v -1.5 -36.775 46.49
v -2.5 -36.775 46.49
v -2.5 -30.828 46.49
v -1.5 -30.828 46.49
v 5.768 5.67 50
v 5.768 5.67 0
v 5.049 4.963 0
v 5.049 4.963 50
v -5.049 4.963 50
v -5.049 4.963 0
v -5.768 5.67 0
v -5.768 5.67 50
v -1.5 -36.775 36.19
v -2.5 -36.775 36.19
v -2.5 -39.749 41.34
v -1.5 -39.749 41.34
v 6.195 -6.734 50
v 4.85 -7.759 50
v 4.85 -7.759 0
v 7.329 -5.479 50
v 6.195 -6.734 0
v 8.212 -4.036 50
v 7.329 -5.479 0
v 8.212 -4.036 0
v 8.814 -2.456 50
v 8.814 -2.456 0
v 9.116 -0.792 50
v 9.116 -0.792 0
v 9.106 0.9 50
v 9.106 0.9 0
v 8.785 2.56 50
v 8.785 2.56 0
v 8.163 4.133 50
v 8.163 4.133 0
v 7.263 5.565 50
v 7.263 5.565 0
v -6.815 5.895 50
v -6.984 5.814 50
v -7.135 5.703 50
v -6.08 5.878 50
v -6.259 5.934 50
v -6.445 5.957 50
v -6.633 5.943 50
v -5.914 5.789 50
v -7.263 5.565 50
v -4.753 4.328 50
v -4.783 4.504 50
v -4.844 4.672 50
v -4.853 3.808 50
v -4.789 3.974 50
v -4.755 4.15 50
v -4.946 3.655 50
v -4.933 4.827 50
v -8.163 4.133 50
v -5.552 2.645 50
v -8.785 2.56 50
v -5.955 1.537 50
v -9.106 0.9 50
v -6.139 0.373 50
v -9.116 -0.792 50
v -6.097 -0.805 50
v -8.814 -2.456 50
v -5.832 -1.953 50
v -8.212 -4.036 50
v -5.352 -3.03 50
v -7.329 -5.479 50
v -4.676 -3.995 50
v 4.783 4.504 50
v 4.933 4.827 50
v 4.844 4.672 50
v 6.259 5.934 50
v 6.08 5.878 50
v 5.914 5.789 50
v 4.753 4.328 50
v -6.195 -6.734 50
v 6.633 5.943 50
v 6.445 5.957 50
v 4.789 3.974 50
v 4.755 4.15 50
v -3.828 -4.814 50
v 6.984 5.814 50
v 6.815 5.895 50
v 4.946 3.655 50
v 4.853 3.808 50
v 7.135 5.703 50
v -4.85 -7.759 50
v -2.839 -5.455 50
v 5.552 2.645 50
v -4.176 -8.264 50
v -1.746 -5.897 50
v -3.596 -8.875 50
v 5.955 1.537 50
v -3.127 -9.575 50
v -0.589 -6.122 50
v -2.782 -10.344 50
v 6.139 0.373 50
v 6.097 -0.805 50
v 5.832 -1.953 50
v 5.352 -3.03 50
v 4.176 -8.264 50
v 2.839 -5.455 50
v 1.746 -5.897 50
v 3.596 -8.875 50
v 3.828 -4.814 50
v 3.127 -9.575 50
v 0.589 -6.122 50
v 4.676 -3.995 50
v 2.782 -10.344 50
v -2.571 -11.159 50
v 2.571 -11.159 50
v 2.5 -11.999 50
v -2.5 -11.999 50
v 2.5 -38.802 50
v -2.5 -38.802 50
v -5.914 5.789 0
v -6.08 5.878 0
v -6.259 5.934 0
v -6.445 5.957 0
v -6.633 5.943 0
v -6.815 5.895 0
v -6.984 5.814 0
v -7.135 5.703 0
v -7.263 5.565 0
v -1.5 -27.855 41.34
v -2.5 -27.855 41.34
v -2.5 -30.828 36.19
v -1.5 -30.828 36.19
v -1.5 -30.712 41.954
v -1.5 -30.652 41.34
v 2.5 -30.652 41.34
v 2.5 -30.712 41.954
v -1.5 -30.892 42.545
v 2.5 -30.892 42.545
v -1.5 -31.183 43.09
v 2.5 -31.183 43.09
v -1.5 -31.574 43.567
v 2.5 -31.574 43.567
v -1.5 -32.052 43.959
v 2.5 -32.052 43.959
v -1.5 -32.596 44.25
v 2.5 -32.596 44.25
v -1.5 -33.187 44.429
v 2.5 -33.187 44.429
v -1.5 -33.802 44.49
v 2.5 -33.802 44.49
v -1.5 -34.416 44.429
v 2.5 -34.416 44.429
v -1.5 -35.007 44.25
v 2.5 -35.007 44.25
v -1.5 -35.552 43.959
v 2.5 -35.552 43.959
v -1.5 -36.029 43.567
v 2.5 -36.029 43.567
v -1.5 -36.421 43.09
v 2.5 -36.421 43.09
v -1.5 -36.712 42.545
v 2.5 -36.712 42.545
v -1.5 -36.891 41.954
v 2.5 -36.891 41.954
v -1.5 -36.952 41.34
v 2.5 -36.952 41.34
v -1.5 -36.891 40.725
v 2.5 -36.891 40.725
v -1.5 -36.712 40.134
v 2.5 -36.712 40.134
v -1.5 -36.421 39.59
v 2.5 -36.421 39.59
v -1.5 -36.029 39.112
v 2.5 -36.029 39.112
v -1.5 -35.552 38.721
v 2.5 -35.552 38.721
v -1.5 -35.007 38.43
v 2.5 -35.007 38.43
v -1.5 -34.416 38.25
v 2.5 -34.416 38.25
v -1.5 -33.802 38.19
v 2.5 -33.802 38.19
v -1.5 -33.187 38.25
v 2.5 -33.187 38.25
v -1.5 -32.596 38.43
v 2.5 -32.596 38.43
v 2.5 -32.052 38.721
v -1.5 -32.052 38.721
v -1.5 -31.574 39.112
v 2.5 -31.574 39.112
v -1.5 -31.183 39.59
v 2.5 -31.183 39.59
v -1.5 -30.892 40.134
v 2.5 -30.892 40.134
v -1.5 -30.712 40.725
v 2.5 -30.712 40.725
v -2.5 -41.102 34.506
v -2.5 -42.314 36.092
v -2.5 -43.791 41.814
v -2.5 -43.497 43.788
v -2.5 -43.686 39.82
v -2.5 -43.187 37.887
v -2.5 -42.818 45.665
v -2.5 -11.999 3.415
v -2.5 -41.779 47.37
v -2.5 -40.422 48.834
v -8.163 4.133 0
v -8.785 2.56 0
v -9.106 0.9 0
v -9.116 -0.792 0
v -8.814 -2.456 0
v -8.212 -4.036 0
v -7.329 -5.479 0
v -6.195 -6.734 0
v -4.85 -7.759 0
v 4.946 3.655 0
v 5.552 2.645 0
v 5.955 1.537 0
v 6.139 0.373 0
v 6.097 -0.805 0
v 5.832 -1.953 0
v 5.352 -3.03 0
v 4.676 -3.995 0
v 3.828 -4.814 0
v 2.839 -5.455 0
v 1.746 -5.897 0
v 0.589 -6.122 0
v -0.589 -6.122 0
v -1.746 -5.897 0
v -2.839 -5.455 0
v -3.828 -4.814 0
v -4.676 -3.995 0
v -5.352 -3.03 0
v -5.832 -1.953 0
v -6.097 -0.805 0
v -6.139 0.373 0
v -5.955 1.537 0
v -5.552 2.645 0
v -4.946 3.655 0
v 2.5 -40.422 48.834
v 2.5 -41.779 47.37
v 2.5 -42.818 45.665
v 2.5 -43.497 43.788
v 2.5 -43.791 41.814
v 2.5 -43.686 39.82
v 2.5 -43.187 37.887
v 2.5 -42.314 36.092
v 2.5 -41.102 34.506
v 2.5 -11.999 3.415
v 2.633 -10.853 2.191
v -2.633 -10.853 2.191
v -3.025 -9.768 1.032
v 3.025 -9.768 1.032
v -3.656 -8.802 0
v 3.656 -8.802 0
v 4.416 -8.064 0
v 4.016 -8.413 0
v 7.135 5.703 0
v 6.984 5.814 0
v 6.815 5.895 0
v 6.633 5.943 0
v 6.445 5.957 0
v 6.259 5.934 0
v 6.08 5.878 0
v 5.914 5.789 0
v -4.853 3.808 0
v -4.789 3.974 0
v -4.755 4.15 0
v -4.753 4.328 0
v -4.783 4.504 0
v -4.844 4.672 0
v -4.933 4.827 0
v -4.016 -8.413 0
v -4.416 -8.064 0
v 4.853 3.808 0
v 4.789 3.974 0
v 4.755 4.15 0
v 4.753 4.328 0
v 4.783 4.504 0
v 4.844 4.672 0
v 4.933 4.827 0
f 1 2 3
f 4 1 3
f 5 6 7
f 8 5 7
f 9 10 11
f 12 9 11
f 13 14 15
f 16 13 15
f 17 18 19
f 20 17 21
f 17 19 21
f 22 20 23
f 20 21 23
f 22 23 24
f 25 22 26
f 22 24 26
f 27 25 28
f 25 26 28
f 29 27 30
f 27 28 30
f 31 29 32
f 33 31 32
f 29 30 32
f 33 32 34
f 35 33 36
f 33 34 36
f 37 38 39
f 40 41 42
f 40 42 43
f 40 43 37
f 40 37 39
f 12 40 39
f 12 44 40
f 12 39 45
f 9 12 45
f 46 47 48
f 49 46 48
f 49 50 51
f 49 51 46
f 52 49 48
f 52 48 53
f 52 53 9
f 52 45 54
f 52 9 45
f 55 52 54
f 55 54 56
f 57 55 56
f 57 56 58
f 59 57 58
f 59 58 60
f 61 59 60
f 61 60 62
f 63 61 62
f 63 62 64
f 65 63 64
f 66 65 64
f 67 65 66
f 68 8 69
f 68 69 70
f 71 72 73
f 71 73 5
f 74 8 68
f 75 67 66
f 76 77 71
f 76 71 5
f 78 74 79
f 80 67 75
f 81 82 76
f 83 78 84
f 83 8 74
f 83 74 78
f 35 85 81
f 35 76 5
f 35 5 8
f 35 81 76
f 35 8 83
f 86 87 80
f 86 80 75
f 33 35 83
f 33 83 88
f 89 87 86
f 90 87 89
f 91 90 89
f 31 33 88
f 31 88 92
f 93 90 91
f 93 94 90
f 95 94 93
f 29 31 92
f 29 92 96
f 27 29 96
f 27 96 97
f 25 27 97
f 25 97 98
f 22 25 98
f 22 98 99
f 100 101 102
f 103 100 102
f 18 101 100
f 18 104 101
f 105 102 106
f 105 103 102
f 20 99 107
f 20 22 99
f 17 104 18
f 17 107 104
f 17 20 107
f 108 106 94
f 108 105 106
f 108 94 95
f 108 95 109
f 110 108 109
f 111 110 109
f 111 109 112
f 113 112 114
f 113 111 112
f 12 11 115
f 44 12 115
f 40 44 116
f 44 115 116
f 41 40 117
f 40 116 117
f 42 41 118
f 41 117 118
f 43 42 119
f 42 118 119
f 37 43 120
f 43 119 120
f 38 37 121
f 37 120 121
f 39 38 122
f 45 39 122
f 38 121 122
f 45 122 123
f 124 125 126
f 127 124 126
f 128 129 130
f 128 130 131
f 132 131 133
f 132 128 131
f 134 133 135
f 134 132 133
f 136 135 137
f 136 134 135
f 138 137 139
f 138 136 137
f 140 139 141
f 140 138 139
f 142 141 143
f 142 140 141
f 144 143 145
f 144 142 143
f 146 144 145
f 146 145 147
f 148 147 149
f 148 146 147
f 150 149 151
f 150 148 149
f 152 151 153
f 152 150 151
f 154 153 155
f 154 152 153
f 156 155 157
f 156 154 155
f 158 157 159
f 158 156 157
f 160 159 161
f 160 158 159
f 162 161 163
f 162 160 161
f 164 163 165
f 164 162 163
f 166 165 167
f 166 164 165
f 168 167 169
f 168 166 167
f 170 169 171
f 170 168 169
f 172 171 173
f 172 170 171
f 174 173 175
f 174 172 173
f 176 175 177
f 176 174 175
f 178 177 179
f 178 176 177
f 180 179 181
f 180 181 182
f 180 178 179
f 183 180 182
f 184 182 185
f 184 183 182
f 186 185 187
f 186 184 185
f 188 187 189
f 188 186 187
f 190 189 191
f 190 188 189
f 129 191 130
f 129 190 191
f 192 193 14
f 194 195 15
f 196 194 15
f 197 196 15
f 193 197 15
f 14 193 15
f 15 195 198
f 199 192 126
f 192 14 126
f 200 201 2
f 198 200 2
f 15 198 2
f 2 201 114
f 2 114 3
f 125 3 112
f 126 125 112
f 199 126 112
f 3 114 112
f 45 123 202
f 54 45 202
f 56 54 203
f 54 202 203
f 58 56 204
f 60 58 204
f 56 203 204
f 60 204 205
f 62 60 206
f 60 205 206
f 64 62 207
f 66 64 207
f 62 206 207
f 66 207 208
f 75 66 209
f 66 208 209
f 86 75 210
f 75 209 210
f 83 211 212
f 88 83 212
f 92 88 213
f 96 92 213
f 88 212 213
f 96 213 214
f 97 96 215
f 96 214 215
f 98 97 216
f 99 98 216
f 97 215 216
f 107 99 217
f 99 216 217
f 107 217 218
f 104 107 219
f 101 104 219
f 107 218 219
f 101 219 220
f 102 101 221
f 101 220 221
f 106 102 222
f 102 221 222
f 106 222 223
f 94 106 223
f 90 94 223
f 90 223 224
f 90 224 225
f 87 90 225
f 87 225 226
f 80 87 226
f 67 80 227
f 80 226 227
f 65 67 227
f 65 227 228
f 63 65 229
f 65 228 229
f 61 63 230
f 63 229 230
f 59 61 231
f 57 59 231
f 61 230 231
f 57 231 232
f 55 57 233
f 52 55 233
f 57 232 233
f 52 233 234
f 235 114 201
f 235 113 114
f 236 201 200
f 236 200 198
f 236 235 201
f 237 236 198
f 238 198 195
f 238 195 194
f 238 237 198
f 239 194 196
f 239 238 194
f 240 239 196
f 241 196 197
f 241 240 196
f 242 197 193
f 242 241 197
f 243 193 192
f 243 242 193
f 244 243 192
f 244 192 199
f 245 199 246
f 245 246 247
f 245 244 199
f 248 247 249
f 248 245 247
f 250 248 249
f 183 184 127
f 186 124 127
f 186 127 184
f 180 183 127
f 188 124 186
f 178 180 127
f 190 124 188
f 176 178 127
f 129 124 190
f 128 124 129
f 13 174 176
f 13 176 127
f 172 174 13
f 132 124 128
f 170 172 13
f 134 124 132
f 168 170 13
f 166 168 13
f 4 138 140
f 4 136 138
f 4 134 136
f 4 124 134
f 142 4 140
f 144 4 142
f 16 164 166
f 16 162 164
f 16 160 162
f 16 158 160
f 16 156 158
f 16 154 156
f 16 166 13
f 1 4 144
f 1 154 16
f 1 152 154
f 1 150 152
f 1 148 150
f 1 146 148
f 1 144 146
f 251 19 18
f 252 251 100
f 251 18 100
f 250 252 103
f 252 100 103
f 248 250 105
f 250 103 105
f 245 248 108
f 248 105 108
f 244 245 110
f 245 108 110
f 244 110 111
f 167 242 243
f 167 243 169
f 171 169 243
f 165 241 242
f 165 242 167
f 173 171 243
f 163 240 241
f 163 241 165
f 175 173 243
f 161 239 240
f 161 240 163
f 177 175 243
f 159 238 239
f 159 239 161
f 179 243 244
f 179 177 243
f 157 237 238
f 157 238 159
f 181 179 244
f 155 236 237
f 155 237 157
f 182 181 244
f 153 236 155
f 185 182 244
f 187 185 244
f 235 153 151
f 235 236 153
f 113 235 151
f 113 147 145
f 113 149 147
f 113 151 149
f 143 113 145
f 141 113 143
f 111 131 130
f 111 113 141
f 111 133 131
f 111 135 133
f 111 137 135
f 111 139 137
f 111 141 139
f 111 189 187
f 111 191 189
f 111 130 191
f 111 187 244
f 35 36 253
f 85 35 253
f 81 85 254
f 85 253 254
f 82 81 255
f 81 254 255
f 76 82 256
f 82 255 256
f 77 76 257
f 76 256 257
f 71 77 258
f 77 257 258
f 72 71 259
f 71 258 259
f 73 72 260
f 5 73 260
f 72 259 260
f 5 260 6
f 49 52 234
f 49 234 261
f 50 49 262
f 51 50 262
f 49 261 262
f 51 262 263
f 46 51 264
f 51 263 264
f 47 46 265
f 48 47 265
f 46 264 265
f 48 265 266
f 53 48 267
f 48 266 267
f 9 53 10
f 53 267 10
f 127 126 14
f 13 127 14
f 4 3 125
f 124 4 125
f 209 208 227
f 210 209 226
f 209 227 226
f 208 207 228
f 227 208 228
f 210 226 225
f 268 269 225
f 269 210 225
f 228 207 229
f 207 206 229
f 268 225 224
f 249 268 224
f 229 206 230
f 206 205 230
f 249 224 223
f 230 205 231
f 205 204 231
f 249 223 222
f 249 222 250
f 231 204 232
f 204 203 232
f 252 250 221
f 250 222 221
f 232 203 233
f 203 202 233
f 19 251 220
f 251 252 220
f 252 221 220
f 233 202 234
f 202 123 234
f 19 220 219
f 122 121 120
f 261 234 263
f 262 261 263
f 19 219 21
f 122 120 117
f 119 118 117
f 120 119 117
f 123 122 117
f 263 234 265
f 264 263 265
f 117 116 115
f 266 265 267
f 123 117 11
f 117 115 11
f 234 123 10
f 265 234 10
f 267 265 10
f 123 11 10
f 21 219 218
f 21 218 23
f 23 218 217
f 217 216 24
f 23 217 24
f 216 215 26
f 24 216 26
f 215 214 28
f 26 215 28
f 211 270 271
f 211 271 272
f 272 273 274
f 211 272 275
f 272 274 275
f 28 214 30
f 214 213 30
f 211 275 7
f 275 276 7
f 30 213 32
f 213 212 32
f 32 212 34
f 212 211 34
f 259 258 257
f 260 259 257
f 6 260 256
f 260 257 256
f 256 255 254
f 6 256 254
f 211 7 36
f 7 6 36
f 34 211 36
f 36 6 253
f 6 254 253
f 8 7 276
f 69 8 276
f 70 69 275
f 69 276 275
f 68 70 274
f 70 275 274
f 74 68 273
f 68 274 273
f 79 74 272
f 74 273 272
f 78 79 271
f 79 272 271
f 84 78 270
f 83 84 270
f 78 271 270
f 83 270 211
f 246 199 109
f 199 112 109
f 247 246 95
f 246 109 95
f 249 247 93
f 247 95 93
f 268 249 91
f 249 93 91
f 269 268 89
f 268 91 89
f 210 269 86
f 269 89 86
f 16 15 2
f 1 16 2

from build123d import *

# Parameters (mm, degrees)
F1_DEPTH = 50
F2_R     = 3.15
F3_DEPTH = 2.5
F4_R     = 3.15
F5_DEPTH = 1
F6_R     = 5


with BuildPart() as f1:
    # F0 (on Top) → F1 (new body)
    with BuildSketch(Plane.XY):
        with BuildLine():
            ThreePointArc((4.9458041958, 3.6553414145), (0, -6.15), (-4.9458041958, 3.6553414145))
            ThreePointArc((-4.9458041958, 3.6553414145), (-4.7531001977, 4.3283874081), (-5.0490024533, 4.9628695557))
            Line((-5.0490024533, 4.9628695557), (-5.7683657215, 5.669960926))
            ThreePointArc((-5.7683657215, 5.669960926), (-6.5394133994, 5.9543407148), (-7.2631501723, 5.5649932232))
            ThreePointArc((-7.2631501723, 5.5649932232), (-8.6851191985, -2.8794451737), (-2.5, -8.8018463972))
            Line((-2.5, -8.8018463972), (2.5, -8.8018463972))
            ThreePointArc((2.5, -8.8018463972), (8.6851191985, -2.8794451737), (7.2631501723, 5.5649932232))
            ThreePointArc((7.2631501723, 5.5649932232), (6.5394133994, 5.9543407148), (5.7683657215, 5.669960926))
            Line((5.7683657215, 5.669960926), (5.0490024533, 4.9628695557))
            ThreePointArc((5.0490024533, 4.9628695557), (4.7531001977, 4.3283874081), (4.9458041958, 3.6553414145))
        make_face()
    extrude(amount=F1_DEPTH)

    # F2 (on Right) → F3 (join, symmetric)
    with BuildSketch(Plane.YZ):
        with BuildLine():
            Line((-41.1023570115, 34.5058199478), (-8.8018463972, 0))
            Line((-8.8018463972, 0), (-8.8018463972, 50))
            Line((-8.8018463972, 50), (-38.8018463972, 50))
            ThreePointArc((-38.8018463972, 50), (-43.6934106929, 42.8084037793), (-41.1023570115, 34.5058199478))
        make_face()
        with Locations((-33.8018463972, 41.3397459622)):
            Circle(F2_R, mode=Mode.SUBTRACT)
    extrude(amount=F3_DEPTH, both=True)

    # F4 (on face) → F5 (cut)
    with BuildSketch(Plane(origin=(-2.5, 0, 0), x_dir=(0, -1, 0), z_dir=(-1, 0, 0))):
        Polygon((36.7752002835, 46.4897459622), (30.8284925109, 46.4897459622), (27.8551386246, 41.3397459622), (30.8284925109, 36.1897459622), (36.7752002835, 36.1897459622), (39.7485541699, 41.3397459622), align=None)
        with Locations((33.8018463972, 41.3397459622)):
            Circle(F4_R, mode=Mode.SUBTRACT)
    extrude(amount=-F5_DEPTH, mode=Mode.SUBTRACT)

    # F6 (call 1 of 2: OpenCascade refuses the feature's edges together)
    f6_edges = [f1.edges().sort_by_distance(p)[0] for p in [
        (2.5, -8.801846, 25),
    ]]
    fillet(f6_edges, radius=F6_R)

    # F6#2 (call 2 of 2)
    f6_2_edges = [f1.edges().sort_by_distance(p)[0] for p in [
        (-2.5, -8.801846, 25),
    ]]
    fillet(f6_2_edges, radius=F6_R)


solid = f1.part
